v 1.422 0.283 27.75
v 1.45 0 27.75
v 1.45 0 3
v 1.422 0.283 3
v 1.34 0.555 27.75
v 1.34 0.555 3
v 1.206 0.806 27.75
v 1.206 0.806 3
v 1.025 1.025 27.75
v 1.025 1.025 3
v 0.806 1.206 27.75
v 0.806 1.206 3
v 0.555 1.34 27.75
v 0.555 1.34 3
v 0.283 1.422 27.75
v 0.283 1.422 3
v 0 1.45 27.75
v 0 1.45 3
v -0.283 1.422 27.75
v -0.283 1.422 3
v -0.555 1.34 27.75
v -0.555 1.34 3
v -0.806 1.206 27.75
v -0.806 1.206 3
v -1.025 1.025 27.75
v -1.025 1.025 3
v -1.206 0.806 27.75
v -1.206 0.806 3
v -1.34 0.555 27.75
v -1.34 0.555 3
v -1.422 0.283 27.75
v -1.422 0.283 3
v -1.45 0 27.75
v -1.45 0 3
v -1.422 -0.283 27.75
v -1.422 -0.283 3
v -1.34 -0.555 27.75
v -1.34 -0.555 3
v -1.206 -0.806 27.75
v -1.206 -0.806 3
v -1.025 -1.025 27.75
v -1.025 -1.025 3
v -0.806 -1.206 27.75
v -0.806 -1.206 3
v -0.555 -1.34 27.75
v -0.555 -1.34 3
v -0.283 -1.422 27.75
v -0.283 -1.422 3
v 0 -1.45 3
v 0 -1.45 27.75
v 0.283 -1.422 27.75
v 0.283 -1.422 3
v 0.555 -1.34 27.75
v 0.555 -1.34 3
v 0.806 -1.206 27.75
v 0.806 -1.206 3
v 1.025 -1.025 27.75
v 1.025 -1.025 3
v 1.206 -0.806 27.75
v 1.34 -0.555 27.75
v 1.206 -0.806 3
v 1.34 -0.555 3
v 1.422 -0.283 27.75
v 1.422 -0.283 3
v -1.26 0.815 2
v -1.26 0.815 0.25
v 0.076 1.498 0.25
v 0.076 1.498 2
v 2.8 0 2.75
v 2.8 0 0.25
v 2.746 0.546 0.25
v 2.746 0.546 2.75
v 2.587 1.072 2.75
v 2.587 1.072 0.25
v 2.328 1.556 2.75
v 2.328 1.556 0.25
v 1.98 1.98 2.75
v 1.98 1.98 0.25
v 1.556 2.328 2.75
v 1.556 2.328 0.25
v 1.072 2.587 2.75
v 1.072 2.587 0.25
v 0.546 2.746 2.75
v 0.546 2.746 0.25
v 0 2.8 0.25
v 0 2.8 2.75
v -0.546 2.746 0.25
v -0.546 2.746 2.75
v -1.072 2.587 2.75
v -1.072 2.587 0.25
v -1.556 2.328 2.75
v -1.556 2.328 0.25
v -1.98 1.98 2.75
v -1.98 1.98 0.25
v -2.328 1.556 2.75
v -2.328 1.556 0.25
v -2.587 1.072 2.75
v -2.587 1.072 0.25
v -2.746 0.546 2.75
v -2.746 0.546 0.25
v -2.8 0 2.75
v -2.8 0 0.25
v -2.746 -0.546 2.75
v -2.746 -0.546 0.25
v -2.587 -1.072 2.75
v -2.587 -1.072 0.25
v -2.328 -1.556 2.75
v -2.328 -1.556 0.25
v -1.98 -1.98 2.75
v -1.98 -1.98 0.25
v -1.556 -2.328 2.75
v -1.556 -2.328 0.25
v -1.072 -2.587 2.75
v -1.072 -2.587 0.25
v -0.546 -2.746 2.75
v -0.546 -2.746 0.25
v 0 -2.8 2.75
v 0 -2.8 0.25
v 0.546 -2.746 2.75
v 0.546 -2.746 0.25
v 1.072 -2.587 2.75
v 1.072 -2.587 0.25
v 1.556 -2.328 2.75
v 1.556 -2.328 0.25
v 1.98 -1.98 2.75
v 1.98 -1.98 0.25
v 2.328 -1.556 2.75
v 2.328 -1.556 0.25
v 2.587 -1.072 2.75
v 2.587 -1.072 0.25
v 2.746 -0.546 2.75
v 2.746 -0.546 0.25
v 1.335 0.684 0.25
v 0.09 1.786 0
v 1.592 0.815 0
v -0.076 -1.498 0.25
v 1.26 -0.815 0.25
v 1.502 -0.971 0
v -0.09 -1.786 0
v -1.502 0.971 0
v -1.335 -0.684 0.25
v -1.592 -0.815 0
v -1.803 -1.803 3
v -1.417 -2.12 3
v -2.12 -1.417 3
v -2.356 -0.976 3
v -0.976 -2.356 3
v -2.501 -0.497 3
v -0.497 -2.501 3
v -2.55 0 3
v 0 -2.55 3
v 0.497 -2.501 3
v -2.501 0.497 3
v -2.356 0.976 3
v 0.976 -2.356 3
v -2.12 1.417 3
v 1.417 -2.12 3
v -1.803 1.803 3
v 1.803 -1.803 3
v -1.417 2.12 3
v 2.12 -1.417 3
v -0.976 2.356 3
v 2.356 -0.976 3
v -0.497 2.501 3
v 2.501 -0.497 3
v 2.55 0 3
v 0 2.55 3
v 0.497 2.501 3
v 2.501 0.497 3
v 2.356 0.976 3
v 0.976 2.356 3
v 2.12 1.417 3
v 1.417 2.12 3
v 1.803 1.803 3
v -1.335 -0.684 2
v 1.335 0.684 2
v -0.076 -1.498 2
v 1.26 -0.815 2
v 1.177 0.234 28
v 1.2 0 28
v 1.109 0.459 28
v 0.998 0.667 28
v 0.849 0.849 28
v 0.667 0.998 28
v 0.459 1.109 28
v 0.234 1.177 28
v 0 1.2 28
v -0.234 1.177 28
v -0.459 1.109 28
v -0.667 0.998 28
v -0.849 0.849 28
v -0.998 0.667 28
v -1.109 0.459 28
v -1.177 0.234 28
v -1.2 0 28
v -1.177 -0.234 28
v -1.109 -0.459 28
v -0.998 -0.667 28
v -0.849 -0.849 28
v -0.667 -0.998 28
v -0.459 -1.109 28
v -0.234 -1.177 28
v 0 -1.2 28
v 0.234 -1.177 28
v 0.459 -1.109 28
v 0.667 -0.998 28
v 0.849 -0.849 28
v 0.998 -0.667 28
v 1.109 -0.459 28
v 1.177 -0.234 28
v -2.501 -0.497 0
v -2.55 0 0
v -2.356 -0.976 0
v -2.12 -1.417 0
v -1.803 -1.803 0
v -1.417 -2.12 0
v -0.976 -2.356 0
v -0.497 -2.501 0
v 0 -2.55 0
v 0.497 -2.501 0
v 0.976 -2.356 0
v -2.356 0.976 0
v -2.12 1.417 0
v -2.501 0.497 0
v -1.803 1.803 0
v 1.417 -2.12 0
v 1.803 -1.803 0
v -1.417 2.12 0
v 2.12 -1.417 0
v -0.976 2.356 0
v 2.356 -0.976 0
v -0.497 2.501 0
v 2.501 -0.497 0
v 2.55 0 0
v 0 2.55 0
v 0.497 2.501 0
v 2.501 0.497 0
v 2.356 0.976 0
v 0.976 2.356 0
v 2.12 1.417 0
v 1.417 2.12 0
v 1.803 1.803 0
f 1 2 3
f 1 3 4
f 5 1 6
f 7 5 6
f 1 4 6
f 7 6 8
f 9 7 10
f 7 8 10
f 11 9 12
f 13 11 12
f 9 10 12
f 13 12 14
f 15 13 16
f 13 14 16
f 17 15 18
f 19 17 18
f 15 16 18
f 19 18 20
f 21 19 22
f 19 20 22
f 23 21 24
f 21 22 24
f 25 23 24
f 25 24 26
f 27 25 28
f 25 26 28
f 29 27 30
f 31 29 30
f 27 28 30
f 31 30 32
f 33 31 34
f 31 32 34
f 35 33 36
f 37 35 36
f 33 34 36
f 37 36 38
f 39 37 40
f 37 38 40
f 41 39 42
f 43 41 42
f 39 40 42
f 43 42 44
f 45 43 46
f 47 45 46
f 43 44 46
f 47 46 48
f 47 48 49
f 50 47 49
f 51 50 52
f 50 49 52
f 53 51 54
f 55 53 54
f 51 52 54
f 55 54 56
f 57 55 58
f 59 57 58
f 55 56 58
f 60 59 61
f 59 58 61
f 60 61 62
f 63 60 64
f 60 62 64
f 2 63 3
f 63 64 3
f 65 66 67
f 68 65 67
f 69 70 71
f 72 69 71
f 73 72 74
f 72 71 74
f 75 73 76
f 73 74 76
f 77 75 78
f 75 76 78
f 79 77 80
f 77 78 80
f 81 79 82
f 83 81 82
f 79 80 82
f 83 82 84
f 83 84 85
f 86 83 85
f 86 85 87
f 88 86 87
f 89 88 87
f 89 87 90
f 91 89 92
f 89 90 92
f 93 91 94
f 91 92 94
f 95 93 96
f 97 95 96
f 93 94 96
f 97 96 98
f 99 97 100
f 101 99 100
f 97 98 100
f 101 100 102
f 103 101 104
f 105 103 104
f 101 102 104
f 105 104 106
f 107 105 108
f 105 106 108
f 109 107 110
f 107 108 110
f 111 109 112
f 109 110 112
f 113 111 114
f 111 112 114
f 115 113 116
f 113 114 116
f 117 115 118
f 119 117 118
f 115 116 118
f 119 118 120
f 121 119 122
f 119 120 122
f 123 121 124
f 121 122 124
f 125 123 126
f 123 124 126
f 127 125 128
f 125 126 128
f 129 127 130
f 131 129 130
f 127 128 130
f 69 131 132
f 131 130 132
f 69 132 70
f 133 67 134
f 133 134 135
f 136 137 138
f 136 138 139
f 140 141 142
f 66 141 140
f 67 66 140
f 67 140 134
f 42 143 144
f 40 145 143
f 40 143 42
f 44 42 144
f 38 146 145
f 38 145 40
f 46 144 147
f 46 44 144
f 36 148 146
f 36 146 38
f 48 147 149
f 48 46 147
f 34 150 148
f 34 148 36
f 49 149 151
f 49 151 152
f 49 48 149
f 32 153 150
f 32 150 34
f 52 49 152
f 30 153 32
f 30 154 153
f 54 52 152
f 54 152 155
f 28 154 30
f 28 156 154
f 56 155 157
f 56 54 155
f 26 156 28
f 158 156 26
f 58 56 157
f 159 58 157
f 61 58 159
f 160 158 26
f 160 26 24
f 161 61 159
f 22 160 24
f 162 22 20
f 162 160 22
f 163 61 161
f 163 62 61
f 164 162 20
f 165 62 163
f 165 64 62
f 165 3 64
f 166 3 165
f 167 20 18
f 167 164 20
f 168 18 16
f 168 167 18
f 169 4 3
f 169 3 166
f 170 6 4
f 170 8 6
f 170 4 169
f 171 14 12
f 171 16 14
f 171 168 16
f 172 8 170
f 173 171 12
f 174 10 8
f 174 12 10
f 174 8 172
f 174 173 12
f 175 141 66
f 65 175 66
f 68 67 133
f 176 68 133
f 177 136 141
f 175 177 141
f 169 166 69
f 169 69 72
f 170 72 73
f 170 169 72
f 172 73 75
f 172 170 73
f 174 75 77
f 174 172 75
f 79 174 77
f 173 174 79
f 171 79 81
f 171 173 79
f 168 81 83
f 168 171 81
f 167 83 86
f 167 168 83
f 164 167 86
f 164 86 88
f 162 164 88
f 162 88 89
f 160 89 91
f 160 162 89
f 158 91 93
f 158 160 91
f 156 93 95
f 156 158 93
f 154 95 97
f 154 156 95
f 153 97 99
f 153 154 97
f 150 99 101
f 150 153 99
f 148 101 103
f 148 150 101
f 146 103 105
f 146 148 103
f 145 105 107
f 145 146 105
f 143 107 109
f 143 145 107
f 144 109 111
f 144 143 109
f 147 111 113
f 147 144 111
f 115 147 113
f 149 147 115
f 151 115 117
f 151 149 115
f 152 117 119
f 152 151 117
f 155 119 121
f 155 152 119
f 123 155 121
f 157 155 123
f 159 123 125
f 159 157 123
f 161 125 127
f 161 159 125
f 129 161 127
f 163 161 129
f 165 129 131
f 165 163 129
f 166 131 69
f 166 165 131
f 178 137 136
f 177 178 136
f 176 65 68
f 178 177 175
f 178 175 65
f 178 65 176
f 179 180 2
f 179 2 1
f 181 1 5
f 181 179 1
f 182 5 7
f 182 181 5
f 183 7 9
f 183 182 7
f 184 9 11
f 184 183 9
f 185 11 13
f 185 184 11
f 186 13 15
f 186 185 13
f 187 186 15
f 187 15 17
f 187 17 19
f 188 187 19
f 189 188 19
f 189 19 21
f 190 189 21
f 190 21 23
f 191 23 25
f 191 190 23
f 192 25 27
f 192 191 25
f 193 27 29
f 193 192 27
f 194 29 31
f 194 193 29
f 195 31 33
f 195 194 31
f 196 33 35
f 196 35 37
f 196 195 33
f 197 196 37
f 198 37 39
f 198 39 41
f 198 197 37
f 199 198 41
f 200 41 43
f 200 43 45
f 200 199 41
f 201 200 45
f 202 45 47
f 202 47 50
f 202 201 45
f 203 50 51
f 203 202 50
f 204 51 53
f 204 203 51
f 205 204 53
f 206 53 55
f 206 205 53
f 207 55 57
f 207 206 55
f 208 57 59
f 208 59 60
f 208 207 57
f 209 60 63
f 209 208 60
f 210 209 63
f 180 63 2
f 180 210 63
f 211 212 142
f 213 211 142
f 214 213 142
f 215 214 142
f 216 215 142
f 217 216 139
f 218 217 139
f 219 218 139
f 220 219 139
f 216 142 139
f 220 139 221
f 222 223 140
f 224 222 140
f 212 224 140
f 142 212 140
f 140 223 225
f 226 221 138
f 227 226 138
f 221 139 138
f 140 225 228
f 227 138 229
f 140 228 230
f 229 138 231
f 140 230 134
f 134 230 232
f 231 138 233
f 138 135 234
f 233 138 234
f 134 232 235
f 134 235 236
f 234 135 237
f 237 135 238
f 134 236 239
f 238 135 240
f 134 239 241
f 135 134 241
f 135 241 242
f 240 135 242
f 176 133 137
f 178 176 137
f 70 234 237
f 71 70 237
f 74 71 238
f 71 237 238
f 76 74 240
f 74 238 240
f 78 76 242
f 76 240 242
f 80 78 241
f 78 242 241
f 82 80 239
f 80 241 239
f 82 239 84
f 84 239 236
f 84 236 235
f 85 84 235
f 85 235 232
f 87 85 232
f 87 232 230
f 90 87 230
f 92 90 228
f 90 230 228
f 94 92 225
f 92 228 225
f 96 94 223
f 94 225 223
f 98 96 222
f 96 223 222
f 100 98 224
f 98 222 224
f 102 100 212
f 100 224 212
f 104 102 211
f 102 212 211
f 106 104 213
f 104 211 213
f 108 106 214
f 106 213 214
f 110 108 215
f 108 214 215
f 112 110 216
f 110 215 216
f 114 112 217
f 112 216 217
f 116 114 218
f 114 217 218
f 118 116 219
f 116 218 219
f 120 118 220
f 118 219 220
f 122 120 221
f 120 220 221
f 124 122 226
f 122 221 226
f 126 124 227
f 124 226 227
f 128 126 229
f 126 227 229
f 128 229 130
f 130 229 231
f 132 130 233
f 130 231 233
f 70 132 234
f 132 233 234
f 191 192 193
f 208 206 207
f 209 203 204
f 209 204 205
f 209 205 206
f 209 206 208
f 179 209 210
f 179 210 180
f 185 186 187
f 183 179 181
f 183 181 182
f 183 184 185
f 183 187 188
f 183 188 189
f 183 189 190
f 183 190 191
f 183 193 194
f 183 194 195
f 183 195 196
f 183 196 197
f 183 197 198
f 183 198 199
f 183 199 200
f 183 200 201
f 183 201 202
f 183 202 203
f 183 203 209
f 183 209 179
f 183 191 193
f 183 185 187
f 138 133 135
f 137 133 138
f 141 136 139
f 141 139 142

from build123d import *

# Parameters (mm, degrees)
SKETCH_R     = 2.8
PAD_DEPTH    = 3
SKETCH001_R  = 1.45
PAD001_DEPTH = 25
POCKET_DEPTH = 2
CHAMFER_SIZE = 0.25


with BuildPart() as part:
    # Sketch → Pad (new body)
    with BuildSketch(Plane.XY):
        Circle(SKETCH_R)
    extrude(amount=PAD_DEPTH)

    # Sketch001 (on Face3 of Pad) → Pad001 (join)
    with BuildSketch(Plane.XY.offset(3)):
        Circle(SKETCH001_R)
    extrude(amount=PAD001_DEPTH)

    # Sketch002 (on Face2 of Pad001) → Pocket (cut)
    with BuildSketch(Plane(origin=(0, 0, 0), x_dir=(1, 0, 0), z_dir=(0, 0, -1))):
        Polygon((1.259542, 0.814588), (-0.075682, 1.49809), (-1.335225, 0.683502), (-1.259542, -0.814588), (0.075682, -1.49809), (1.335225, -0.683502), align=None)
    extrude(amount=-POCKET_DEPTH, mode=Mode.SUBTRACT)

    # Chamfer
    chamfer_edges = [part.edges().sort_by_distance(p)[0] for p in [
        (-2.8, 0, 3),
        (-2.8, 0, 0),
        (1.297384, -0.065543, 0),
        (0.705454, 1.090796, 0),
        (-0.59193, 1.156339, 0),
        (-1.297384, 0.065543, 0),
        (-0.705454, -1.090796, 0),
        (0.59193, -1.156339, 0),
        (-1.45, 0, 28),
    ]]
    chamfer(chamfer_edges, length=CHAMFER_SIZE)


solid = part.part
